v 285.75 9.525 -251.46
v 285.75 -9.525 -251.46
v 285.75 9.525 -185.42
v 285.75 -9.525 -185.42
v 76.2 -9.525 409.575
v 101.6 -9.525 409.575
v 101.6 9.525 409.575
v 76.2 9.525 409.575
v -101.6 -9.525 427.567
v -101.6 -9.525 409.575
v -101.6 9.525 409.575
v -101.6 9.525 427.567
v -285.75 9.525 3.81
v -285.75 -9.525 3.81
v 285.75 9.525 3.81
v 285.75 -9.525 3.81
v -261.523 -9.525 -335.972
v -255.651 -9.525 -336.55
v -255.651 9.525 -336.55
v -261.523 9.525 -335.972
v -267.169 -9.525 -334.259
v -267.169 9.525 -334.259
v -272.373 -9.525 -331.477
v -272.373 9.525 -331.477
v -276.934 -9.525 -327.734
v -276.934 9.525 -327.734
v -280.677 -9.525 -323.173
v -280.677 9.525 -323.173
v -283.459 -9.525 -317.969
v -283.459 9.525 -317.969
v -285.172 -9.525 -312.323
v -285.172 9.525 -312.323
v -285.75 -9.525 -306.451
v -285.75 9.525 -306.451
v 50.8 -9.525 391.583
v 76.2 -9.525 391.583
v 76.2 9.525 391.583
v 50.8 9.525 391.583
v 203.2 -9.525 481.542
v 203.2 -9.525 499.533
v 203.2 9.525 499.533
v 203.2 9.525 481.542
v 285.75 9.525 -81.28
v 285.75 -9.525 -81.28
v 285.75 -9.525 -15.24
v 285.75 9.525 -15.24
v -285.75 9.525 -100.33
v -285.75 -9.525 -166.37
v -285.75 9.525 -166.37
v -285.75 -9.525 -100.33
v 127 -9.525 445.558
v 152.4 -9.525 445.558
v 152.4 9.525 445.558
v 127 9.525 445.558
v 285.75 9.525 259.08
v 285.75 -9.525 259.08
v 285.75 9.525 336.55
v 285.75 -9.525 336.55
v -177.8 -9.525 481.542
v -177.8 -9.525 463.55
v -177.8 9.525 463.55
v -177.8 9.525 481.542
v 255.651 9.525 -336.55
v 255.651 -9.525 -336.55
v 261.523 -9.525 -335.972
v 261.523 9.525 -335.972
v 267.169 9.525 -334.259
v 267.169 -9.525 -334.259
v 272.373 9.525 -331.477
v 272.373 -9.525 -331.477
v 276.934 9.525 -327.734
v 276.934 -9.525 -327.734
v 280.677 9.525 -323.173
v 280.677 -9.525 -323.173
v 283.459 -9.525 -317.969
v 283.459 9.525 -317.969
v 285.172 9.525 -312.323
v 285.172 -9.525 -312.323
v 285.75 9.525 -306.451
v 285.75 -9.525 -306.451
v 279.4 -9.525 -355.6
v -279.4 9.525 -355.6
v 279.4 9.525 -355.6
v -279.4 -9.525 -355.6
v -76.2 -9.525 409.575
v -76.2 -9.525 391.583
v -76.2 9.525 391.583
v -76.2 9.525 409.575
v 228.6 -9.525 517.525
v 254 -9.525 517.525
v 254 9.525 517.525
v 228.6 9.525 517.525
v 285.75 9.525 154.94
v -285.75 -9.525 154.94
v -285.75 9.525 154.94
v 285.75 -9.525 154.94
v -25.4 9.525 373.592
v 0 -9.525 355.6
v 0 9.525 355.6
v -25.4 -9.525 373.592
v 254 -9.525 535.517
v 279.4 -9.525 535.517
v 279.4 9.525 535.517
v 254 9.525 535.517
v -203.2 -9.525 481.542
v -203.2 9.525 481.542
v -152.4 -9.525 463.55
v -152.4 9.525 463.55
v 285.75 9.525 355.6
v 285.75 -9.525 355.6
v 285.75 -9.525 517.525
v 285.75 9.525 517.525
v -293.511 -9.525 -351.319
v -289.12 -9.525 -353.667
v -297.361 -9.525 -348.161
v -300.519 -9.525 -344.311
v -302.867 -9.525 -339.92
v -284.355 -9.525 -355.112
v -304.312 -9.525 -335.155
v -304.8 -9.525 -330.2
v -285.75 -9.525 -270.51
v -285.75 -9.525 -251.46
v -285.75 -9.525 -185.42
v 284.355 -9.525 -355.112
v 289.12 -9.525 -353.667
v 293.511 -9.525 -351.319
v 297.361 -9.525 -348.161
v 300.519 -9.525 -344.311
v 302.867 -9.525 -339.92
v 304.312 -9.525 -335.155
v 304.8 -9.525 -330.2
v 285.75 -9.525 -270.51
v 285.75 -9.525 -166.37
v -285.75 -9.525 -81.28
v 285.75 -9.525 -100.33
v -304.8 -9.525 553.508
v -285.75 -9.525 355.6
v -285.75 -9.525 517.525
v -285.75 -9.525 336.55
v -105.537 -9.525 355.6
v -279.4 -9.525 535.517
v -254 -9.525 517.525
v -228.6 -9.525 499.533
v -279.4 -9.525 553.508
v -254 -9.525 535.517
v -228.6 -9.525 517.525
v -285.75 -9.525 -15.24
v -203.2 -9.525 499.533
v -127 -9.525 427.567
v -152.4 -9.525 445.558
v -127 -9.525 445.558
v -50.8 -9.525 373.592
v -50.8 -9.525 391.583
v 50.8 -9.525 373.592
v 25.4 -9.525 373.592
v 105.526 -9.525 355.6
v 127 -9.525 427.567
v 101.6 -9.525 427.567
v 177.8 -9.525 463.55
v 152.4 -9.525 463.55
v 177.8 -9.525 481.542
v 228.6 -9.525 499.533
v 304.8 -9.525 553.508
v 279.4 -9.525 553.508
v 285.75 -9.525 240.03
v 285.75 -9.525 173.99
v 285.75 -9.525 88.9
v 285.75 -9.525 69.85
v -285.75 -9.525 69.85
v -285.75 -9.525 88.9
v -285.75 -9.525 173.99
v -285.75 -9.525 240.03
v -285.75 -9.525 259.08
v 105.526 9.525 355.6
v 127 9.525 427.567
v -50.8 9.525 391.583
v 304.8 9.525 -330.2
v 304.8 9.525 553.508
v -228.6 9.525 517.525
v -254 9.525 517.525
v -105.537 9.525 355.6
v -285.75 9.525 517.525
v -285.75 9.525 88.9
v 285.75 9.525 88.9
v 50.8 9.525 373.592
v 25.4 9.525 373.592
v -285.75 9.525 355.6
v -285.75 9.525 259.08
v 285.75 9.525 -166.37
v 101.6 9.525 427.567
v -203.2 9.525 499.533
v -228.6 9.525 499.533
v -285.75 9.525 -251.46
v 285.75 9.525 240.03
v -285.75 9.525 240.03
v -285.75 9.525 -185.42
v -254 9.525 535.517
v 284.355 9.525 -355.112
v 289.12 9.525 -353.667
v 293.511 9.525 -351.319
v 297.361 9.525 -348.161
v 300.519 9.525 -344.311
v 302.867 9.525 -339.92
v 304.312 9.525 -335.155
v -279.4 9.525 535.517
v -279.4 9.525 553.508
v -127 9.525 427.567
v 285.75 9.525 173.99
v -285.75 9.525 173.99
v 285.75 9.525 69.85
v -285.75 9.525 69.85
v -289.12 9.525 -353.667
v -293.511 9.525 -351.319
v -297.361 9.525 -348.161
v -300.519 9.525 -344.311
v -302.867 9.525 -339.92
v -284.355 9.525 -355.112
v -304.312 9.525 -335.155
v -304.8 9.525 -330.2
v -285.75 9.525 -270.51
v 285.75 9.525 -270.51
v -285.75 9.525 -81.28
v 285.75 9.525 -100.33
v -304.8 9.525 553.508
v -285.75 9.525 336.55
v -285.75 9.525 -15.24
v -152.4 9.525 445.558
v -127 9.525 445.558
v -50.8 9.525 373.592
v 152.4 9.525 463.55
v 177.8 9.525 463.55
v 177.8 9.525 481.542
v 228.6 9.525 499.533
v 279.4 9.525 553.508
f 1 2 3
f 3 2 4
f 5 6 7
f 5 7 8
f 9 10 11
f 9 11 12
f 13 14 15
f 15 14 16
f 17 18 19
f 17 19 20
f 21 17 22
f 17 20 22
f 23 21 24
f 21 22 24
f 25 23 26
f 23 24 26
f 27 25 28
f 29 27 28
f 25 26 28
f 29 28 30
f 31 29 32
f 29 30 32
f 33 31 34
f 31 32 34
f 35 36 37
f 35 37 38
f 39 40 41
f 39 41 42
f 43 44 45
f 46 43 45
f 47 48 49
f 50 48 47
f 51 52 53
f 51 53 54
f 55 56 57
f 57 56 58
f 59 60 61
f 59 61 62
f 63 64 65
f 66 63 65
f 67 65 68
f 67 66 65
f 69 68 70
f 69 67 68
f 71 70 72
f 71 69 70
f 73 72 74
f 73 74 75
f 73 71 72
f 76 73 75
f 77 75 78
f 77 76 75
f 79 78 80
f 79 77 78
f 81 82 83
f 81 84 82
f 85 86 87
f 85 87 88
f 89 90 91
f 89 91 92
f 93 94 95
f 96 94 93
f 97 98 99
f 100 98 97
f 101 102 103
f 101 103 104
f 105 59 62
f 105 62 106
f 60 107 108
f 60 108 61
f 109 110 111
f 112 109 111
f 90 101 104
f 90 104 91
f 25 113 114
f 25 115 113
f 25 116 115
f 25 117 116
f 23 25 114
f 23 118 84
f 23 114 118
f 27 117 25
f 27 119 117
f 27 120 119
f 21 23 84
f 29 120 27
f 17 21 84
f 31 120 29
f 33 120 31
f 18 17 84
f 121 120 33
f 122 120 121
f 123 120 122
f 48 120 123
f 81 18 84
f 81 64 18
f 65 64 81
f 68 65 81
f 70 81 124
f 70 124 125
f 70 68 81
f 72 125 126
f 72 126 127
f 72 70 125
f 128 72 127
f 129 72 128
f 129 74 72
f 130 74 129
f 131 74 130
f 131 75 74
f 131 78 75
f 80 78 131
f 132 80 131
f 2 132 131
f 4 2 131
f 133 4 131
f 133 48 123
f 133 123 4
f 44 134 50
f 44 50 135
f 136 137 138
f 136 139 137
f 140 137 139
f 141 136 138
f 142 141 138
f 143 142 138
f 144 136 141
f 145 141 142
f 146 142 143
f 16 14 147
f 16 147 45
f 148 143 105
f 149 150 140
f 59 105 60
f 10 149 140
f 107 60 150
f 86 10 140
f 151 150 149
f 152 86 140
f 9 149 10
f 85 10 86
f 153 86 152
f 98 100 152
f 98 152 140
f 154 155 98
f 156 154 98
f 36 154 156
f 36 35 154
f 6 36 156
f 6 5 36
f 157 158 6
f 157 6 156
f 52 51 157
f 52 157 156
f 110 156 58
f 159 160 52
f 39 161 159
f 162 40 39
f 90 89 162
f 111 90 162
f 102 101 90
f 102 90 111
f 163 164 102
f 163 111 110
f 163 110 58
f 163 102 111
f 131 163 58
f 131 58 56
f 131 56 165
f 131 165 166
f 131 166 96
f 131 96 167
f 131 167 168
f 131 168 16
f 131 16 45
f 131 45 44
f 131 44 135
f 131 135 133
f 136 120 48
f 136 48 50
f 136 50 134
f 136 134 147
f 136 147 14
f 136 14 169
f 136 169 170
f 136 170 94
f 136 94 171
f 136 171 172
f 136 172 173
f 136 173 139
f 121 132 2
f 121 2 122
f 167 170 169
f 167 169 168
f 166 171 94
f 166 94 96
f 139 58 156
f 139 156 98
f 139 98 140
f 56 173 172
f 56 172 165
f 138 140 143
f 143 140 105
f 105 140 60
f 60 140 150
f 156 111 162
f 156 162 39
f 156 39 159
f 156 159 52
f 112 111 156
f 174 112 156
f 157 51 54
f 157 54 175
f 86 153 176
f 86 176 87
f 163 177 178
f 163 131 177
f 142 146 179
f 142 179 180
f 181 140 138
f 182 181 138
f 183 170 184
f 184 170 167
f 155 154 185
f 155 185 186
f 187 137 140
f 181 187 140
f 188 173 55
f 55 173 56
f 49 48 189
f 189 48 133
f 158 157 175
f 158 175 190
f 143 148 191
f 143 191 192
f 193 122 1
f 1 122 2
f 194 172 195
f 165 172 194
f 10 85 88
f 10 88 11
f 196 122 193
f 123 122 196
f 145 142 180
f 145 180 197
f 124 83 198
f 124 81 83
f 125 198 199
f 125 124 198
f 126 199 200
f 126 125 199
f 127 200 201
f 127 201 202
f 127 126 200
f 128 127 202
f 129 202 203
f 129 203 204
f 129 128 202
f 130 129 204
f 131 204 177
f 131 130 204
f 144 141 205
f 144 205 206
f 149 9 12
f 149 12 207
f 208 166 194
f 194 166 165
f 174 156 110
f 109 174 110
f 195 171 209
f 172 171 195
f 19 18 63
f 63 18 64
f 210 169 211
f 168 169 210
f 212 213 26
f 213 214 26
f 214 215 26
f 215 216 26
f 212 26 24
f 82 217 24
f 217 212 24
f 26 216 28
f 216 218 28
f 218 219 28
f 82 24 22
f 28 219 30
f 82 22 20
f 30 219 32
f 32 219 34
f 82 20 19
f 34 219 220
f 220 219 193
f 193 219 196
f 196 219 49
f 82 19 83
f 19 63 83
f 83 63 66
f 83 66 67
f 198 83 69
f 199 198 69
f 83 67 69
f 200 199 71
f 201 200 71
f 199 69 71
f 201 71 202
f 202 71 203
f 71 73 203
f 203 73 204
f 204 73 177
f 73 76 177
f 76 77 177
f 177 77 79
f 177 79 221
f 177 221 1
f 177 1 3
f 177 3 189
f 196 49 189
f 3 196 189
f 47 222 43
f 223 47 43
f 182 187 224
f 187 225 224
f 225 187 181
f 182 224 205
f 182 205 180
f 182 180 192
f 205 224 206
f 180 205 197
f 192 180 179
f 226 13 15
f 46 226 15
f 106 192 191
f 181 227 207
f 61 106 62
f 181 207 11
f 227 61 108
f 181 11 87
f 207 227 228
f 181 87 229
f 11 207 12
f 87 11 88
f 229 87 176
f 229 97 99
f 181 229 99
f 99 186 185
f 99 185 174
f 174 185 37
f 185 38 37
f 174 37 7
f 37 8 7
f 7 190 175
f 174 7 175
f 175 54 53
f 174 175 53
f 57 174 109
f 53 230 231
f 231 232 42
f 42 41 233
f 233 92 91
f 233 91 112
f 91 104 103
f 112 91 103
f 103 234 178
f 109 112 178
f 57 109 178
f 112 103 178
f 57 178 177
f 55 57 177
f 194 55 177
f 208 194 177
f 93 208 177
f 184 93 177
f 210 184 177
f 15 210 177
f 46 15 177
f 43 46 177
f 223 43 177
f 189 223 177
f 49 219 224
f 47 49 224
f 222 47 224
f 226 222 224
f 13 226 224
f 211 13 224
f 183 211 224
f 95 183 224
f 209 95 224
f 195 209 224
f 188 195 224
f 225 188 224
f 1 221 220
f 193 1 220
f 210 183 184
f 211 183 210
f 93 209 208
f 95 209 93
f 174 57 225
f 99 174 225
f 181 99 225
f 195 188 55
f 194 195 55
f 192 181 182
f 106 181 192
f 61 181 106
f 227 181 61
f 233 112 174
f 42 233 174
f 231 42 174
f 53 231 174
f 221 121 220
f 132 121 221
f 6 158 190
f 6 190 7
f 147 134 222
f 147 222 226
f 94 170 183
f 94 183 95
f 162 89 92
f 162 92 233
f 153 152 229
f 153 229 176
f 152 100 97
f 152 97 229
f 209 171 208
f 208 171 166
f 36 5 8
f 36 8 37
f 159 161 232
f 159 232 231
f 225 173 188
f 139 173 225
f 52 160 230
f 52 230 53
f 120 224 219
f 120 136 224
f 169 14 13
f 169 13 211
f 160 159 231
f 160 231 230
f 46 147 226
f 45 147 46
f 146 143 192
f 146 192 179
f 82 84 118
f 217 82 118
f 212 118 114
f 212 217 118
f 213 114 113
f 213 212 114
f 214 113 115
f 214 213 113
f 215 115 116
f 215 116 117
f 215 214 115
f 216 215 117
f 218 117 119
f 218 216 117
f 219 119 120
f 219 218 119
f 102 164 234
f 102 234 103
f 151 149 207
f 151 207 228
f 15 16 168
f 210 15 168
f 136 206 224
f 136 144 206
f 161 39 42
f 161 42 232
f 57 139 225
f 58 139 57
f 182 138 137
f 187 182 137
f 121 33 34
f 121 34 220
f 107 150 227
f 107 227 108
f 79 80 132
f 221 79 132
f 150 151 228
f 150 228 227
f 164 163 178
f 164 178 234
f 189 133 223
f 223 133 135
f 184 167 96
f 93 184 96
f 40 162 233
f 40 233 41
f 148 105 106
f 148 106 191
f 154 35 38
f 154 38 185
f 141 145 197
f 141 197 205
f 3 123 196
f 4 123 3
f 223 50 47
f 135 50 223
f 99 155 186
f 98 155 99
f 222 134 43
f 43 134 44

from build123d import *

# Parameters (mm, degrees)
F1_DEPTH = 9.525
F2_R     = 25.4
F3_W     = 571.5
F3_H     = 673.1
F4_DEPTH = 19.051
F5_R     = 30.099
F7_DEPTH = 19.051
F8_W     = 571.5
F8_H     = 19.05
F9_DEPTH = 19.05


with BuildPart() as f1:
    # F0 (on Front) → F1 (new body, symmetric)
    with BuildSketch(Plane.XZ):
        Polygon((-304.8, 355.6), (-304.8, -355.6), (304.8, -355.6), (304.8, 355.6), (0, 355.6), align=None)
        Polygon((-304.8, 553.508333), (-304.8, 355.6), (0, 355.6), (-25.4, 373.591667), (-50.8, 373.591667), (-50.8, 391.583333), (-76.2, 391.583333), (-76.2, 409.575), (-101.6, 409.575), (-101.6, 427.566667), (-127, 427.566667), (-127, 445.558333), (-152.4, 445.558333), (-152.4, 463.55), (-177.8, 463.55), (-177.8, 481.541667), (-203.2, 481.541667), (-203.2, 499.533333), (-228.6, 499.533333), (-228.6, 517.525), (-254, 517.525), (-254, 535.516667), (-279.4, 535.516667), (-279.4, 553.508333), align=None)
        Polygon((0, 355.6), (304.8, 355.6), (304.8, 553.508333), (279.4, 553.508333), (279.4, 535.516667), (254, 535.516667), (254, 517.525), (228.6, 517.525), (228.6, 499.533333), (203.2, 499.533333), (203.2, 481.541667), (177.8, 481.541667), (177.8, 463.55), (152.4, 463.55), (152.4, 445.558333), (127, 445.558333), (127, 427.566667), (101.6, 427.566667), (101.6, 409.575), (76.2, 409.575), (76.2, 391.583333), (50.8, 391.583333), (50.8, 373.591667), (25.4, 373.591667), align=None)
    extrude(amount=F1_DEPTH, both=True)

    # F2
    f2_edges = [f1.edges().sort_by_distance(p)[0] for p in [
        (-304.8, 0, -355.6),
        (304.8, 0, -355.6),
    ]]
    fillet(f2_edges, radius=F2_R)

    # F3 (on face) → F4 (cut, through all)
    with BuildSketch(Plane.XZ.offset(9.525)):
        Rectangle(F3_W, F3_H)
    extrude(amount=-F4_DEPTH, mode=Mode.SUBTRACT)

    # F5
    f5_edges = [f1.edges().sort_by_distance(p)[0] for p in [
        (285.75, 0, -336.55),
        (-285.75, 0, -336.55),
    ]]
    fillet(f5_edges, radius=F5_R)

    # F6 (on face) → F7 (cut, through all)
    with BuildSketch(Plane.XZ.offset(9.525)):
        Polygon((-285.75, 355.6), (-105.537, 355.6), (-285.75, 517.525), align=None)
        Polygon((105.526209, 355.6), (285.75, 355.6), (285.75, 517.525), align=None)
    extrude(amount=-F7_DEPTH, mode=Mode.SUBTRACT)

    # F8 (on face) → F9 (join)
    with BuildSketch(Plane.XZ.offset(9.525)):
        with Locations((0, 164.465)):
            Rectangle(F8_W, F8_H)
        with Locations((0, 249.555)):
            Rectangle(F8_W, F8_H)
        with Locations((0, 79.375)):
            Rectangle(F8_W, F8_H)
        with Locations((0, -5.715)):
            Rectangle(F8_W, F8_H)
        with Locations((0, -90.805)):
            Rectangle(F8_W, F8_H)
        with Locations((0, -175.895)):
            Rectangle(F8_W, F8_H)
        with Locations((0, -260.985)):
            Rectangle(F8_W, F8_H)
    extrude(amount=-F9_DEPTH)


solid = f1.part
